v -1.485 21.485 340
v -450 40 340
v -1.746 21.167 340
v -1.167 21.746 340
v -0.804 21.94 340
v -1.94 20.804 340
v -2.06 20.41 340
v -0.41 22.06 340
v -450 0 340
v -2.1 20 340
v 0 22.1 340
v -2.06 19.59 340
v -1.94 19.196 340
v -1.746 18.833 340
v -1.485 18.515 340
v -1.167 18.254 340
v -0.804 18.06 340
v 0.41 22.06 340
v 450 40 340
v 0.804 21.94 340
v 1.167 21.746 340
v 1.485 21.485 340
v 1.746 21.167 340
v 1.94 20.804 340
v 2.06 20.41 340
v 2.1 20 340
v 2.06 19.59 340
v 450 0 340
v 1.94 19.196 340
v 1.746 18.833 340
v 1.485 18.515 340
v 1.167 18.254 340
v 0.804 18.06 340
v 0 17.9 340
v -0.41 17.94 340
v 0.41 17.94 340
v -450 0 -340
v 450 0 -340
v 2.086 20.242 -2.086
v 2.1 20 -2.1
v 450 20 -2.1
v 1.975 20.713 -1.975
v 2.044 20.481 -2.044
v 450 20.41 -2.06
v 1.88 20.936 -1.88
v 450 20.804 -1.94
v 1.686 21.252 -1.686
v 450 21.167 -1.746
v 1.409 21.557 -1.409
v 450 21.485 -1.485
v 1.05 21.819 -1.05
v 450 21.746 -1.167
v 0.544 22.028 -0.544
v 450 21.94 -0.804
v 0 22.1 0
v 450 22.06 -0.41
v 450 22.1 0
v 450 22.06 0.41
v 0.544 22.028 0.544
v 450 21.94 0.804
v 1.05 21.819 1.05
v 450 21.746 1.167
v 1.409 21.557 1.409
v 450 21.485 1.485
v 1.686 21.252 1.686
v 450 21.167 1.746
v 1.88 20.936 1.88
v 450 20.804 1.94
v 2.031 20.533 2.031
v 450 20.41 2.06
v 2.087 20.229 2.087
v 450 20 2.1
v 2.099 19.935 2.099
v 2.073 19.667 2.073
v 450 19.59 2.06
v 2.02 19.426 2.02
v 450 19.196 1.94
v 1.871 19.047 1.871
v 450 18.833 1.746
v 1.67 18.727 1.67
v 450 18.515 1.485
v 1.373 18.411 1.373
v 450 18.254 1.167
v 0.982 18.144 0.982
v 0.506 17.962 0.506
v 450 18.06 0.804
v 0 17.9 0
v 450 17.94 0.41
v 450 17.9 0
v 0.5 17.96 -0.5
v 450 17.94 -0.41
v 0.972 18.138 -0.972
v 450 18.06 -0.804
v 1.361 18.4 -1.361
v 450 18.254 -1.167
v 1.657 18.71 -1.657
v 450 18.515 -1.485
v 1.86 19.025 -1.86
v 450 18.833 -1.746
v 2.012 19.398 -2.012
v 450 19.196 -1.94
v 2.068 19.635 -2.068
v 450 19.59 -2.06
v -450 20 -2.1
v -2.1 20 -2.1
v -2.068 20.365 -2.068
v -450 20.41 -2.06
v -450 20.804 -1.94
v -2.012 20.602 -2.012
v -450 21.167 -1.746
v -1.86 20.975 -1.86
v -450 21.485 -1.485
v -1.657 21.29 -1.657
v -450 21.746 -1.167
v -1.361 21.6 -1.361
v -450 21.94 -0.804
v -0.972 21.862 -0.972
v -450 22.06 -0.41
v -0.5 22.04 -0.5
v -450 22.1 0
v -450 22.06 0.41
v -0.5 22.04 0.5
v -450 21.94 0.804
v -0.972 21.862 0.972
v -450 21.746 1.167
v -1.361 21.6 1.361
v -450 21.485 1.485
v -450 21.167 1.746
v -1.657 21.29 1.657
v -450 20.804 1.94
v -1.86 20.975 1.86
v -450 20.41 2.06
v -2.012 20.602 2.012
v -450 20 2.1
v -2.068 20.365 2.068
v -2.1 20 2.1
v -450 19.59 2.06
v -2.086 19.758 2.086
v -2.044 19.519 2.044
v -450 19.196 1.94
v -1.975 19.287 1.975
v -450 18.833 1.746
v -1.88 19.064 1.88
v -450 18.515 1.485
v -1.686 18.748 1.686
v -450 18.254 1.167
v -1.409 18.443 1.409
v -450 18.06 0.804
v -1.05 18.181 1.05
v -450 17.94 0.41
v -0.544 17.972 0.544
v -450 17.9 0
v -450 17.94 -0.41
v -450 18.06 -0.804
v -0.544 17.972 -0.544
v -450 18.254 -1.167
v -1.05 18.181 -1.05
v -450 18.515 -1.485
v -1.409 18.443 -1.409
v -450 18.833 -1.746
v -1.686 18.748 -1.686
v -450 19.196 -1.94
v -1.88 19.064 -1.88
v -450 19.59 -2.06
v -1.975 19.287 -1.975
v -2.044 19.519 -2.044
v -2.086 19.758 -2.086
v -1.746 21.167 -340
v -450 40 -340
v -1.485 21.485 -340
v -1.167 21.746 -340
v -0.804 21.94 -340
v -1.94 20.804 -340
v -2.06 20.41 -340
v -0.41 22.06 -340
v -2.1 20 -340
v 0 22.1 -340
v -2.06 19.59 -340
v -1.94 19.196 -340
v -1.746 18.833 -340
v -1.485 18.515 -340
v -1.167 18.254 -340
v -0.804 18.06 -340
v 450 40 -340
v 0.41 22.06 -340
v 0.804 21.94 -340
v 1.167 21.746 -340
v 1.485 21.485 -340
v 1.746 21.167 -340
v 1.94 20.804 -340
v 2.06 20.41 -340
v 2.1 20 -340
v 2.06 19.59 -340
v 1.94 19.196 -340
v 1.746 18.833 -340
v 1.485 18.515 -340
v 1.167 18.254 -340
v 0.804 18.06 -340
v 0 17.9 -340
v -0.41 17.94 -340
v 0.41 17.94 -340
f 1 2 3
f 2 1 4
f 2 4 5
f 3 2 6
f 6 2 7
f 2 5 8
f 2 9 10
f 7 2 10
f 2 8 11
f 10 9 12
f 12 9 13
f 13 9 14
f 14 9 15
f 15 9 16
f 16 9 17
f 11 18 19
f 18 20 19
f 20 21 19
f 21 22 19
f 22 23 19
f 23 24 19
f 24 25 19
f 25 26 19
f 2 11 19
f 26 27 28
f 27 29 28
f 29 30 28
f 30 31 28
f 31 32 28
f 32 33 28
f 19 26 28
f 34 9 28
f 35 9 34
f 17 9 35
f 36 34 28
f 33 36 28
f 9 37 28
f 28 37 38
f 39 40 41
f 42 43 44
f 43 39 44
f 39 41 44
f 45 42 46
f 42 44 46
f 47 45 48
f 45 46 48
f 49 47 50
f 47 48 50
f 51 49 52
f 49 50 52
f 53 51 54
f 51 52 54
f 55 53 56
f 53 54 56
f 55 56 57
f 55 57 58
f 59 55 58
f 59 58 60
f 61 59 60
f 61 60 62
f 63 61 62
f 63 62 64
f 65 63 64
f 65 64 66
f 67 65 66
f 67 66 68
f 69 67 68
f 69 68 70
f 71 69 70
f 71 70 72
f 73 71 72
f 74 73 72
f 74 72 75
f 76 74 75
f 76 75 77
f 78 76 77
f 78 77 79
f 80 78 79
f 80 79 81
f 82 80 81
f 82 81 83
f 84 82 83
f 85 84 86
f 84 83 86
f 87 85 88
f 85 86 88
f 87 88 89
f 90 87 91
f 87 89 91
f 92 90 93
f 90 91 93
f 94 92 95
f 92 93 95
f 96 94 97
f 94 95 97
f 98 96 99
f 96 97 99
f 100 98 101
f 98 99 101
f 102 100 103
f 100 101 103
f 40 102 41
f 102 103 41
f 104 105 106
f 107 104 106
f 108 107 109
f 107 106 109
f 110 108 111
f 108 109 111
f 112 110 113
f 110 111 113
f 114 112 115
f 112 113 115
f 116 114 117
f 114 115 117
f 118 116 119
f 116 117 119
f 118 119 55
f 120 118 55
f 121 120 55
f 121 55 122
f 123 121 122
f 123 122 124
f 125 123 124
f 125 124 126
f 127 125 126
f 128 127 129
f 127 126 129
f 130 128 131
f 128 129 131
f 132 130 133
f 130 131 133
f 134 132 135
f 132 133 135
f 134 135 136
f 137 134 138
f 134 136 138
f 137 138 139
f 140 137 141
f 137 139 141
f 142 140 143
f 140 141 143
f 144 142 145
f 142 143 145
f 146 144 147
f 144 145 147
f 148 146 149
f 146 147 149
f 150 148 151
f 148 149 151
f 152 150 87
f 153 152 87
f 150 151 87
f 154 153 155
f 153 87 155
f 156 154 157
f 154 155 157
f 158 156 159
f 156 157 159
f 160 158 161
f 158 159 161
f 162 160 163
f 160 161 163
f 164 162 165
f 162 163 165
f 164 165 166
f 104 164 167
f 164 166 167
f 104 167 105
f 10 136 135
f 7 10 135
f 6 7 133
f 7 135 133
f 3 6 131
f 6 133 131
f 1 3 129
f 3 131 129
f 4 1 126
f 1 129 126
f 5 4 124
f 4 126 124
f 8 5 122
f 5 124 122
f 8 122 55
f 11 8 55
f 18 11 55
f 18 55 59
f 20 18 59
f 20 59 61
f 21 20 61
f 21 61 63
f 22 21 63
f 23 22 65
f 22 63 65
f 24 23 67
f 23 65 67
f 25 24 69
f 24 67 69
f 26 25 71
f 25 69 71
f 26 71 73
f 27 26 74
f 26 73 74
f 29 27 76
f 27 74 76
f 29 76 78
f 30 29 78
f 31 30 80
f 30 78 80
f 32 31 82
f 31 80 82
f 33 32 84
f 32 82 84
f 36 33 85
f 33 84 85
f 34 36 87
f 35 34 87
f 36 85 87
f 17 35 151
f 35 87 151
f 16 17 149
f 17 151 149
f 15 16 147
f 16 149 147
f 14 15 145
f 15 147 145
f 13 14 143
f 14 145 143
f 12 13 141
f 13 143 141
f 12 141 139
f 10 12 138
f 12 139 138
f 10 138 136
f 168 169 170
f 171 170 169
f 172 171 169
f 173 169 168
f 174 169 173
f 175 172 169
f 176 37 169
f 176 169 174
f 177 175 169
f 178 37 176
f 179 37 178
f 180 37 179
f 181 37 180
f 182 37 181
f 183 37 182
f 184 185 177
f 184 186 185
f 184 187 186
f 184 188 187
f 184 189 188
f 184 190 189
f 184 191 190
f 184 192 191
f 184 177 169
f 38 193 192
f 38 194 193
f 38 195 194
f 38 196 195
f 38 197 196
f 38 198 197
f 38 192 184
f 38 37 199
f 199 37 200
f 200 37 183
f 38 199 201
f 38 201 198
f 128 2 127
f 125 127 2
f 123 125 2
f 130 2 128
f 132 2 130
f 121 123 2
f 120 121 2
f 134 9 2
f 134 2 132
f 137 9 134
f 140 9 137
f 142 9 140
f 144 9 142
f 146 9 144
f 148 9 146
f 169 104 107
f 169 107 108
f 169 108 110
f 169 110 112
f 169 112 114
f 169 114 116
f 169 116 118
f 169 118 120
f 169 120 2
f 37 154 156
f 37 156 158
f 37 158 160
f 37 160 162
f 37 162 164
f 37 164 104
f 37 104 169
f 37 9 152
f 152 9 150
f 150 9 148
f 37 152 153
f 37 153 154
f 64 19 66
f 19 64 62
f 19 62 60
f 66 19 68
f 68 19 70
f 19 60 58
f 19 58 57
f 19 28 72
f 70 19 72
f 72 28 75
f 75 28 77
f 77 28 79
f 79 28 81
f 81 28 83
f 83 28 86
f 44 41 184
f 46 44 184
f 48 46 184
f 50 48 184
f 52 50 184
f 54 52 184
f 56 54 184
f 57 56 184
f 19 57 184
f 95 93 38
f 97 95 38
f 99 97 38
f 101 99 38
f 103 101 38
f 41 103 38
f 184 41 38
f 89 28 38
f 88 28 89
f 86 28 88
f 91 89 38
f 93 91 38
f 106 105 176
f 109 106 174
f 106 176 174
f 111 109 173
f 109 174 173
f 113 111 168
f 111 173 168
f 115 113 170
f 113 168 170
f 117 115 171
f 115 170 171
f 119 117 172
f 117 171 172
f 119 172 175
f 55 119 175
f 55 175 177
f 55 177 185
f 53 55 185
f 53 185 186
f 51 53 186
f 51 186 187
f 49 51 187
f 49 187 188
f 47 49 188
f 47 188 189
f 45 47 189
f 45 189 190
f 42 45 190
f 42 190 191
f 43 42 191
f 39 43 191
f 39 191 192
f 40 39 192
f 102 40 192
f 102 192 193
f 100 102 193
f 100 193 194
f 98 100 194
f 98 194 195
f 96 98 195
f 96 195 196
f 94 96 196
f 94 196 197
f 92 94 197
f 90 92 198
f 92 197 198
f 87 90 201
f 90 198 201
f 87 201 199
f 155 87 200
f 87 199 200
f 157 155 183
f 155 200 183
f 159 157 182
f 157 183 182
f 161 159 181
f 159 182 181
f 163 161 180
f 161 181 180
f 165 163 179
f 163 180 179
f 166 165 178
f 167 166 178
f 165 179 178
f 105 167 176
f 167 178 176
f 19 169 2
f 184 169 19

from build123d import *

# Parameters (mm, degrees)
SKETCH_1_W         = 900
SKETCH_1_H         = 680
EXTRUDE_1_DEPTH    = 40
HOLE_WIZARD_M5_1_D = 4.2
HOLE_WIZARD_M5_2_D = 4.2


with BuildPart() as part:
    # 草图1 → 凸台-拉伸1 (new body)
    with BuildSketch(Plane(origin=(0, 0, 0), x_dir=(1, 0, 0), z_dir=(0, 1, 0))):
        Rectangle(SKETCH_1_W, SKETCH_1_H)
    extrude(amount=EXTRUDE_1_DEPTH)

    # M5 螺纹孔1 (through all)
    with Locations(Plane.XY.offset(340)):
        with Locations((0, 20)):
            Hole(HOLE_WIZARD_M5_1_D / 2)

    # M5 螺纹孔2 (through all)
    with Locations(Plane.ZY.offset(450)):
        with Locations((0, 20)):
            Hole(HOLE_WIZARD_M5_2_D / 2)


solid = part.part
